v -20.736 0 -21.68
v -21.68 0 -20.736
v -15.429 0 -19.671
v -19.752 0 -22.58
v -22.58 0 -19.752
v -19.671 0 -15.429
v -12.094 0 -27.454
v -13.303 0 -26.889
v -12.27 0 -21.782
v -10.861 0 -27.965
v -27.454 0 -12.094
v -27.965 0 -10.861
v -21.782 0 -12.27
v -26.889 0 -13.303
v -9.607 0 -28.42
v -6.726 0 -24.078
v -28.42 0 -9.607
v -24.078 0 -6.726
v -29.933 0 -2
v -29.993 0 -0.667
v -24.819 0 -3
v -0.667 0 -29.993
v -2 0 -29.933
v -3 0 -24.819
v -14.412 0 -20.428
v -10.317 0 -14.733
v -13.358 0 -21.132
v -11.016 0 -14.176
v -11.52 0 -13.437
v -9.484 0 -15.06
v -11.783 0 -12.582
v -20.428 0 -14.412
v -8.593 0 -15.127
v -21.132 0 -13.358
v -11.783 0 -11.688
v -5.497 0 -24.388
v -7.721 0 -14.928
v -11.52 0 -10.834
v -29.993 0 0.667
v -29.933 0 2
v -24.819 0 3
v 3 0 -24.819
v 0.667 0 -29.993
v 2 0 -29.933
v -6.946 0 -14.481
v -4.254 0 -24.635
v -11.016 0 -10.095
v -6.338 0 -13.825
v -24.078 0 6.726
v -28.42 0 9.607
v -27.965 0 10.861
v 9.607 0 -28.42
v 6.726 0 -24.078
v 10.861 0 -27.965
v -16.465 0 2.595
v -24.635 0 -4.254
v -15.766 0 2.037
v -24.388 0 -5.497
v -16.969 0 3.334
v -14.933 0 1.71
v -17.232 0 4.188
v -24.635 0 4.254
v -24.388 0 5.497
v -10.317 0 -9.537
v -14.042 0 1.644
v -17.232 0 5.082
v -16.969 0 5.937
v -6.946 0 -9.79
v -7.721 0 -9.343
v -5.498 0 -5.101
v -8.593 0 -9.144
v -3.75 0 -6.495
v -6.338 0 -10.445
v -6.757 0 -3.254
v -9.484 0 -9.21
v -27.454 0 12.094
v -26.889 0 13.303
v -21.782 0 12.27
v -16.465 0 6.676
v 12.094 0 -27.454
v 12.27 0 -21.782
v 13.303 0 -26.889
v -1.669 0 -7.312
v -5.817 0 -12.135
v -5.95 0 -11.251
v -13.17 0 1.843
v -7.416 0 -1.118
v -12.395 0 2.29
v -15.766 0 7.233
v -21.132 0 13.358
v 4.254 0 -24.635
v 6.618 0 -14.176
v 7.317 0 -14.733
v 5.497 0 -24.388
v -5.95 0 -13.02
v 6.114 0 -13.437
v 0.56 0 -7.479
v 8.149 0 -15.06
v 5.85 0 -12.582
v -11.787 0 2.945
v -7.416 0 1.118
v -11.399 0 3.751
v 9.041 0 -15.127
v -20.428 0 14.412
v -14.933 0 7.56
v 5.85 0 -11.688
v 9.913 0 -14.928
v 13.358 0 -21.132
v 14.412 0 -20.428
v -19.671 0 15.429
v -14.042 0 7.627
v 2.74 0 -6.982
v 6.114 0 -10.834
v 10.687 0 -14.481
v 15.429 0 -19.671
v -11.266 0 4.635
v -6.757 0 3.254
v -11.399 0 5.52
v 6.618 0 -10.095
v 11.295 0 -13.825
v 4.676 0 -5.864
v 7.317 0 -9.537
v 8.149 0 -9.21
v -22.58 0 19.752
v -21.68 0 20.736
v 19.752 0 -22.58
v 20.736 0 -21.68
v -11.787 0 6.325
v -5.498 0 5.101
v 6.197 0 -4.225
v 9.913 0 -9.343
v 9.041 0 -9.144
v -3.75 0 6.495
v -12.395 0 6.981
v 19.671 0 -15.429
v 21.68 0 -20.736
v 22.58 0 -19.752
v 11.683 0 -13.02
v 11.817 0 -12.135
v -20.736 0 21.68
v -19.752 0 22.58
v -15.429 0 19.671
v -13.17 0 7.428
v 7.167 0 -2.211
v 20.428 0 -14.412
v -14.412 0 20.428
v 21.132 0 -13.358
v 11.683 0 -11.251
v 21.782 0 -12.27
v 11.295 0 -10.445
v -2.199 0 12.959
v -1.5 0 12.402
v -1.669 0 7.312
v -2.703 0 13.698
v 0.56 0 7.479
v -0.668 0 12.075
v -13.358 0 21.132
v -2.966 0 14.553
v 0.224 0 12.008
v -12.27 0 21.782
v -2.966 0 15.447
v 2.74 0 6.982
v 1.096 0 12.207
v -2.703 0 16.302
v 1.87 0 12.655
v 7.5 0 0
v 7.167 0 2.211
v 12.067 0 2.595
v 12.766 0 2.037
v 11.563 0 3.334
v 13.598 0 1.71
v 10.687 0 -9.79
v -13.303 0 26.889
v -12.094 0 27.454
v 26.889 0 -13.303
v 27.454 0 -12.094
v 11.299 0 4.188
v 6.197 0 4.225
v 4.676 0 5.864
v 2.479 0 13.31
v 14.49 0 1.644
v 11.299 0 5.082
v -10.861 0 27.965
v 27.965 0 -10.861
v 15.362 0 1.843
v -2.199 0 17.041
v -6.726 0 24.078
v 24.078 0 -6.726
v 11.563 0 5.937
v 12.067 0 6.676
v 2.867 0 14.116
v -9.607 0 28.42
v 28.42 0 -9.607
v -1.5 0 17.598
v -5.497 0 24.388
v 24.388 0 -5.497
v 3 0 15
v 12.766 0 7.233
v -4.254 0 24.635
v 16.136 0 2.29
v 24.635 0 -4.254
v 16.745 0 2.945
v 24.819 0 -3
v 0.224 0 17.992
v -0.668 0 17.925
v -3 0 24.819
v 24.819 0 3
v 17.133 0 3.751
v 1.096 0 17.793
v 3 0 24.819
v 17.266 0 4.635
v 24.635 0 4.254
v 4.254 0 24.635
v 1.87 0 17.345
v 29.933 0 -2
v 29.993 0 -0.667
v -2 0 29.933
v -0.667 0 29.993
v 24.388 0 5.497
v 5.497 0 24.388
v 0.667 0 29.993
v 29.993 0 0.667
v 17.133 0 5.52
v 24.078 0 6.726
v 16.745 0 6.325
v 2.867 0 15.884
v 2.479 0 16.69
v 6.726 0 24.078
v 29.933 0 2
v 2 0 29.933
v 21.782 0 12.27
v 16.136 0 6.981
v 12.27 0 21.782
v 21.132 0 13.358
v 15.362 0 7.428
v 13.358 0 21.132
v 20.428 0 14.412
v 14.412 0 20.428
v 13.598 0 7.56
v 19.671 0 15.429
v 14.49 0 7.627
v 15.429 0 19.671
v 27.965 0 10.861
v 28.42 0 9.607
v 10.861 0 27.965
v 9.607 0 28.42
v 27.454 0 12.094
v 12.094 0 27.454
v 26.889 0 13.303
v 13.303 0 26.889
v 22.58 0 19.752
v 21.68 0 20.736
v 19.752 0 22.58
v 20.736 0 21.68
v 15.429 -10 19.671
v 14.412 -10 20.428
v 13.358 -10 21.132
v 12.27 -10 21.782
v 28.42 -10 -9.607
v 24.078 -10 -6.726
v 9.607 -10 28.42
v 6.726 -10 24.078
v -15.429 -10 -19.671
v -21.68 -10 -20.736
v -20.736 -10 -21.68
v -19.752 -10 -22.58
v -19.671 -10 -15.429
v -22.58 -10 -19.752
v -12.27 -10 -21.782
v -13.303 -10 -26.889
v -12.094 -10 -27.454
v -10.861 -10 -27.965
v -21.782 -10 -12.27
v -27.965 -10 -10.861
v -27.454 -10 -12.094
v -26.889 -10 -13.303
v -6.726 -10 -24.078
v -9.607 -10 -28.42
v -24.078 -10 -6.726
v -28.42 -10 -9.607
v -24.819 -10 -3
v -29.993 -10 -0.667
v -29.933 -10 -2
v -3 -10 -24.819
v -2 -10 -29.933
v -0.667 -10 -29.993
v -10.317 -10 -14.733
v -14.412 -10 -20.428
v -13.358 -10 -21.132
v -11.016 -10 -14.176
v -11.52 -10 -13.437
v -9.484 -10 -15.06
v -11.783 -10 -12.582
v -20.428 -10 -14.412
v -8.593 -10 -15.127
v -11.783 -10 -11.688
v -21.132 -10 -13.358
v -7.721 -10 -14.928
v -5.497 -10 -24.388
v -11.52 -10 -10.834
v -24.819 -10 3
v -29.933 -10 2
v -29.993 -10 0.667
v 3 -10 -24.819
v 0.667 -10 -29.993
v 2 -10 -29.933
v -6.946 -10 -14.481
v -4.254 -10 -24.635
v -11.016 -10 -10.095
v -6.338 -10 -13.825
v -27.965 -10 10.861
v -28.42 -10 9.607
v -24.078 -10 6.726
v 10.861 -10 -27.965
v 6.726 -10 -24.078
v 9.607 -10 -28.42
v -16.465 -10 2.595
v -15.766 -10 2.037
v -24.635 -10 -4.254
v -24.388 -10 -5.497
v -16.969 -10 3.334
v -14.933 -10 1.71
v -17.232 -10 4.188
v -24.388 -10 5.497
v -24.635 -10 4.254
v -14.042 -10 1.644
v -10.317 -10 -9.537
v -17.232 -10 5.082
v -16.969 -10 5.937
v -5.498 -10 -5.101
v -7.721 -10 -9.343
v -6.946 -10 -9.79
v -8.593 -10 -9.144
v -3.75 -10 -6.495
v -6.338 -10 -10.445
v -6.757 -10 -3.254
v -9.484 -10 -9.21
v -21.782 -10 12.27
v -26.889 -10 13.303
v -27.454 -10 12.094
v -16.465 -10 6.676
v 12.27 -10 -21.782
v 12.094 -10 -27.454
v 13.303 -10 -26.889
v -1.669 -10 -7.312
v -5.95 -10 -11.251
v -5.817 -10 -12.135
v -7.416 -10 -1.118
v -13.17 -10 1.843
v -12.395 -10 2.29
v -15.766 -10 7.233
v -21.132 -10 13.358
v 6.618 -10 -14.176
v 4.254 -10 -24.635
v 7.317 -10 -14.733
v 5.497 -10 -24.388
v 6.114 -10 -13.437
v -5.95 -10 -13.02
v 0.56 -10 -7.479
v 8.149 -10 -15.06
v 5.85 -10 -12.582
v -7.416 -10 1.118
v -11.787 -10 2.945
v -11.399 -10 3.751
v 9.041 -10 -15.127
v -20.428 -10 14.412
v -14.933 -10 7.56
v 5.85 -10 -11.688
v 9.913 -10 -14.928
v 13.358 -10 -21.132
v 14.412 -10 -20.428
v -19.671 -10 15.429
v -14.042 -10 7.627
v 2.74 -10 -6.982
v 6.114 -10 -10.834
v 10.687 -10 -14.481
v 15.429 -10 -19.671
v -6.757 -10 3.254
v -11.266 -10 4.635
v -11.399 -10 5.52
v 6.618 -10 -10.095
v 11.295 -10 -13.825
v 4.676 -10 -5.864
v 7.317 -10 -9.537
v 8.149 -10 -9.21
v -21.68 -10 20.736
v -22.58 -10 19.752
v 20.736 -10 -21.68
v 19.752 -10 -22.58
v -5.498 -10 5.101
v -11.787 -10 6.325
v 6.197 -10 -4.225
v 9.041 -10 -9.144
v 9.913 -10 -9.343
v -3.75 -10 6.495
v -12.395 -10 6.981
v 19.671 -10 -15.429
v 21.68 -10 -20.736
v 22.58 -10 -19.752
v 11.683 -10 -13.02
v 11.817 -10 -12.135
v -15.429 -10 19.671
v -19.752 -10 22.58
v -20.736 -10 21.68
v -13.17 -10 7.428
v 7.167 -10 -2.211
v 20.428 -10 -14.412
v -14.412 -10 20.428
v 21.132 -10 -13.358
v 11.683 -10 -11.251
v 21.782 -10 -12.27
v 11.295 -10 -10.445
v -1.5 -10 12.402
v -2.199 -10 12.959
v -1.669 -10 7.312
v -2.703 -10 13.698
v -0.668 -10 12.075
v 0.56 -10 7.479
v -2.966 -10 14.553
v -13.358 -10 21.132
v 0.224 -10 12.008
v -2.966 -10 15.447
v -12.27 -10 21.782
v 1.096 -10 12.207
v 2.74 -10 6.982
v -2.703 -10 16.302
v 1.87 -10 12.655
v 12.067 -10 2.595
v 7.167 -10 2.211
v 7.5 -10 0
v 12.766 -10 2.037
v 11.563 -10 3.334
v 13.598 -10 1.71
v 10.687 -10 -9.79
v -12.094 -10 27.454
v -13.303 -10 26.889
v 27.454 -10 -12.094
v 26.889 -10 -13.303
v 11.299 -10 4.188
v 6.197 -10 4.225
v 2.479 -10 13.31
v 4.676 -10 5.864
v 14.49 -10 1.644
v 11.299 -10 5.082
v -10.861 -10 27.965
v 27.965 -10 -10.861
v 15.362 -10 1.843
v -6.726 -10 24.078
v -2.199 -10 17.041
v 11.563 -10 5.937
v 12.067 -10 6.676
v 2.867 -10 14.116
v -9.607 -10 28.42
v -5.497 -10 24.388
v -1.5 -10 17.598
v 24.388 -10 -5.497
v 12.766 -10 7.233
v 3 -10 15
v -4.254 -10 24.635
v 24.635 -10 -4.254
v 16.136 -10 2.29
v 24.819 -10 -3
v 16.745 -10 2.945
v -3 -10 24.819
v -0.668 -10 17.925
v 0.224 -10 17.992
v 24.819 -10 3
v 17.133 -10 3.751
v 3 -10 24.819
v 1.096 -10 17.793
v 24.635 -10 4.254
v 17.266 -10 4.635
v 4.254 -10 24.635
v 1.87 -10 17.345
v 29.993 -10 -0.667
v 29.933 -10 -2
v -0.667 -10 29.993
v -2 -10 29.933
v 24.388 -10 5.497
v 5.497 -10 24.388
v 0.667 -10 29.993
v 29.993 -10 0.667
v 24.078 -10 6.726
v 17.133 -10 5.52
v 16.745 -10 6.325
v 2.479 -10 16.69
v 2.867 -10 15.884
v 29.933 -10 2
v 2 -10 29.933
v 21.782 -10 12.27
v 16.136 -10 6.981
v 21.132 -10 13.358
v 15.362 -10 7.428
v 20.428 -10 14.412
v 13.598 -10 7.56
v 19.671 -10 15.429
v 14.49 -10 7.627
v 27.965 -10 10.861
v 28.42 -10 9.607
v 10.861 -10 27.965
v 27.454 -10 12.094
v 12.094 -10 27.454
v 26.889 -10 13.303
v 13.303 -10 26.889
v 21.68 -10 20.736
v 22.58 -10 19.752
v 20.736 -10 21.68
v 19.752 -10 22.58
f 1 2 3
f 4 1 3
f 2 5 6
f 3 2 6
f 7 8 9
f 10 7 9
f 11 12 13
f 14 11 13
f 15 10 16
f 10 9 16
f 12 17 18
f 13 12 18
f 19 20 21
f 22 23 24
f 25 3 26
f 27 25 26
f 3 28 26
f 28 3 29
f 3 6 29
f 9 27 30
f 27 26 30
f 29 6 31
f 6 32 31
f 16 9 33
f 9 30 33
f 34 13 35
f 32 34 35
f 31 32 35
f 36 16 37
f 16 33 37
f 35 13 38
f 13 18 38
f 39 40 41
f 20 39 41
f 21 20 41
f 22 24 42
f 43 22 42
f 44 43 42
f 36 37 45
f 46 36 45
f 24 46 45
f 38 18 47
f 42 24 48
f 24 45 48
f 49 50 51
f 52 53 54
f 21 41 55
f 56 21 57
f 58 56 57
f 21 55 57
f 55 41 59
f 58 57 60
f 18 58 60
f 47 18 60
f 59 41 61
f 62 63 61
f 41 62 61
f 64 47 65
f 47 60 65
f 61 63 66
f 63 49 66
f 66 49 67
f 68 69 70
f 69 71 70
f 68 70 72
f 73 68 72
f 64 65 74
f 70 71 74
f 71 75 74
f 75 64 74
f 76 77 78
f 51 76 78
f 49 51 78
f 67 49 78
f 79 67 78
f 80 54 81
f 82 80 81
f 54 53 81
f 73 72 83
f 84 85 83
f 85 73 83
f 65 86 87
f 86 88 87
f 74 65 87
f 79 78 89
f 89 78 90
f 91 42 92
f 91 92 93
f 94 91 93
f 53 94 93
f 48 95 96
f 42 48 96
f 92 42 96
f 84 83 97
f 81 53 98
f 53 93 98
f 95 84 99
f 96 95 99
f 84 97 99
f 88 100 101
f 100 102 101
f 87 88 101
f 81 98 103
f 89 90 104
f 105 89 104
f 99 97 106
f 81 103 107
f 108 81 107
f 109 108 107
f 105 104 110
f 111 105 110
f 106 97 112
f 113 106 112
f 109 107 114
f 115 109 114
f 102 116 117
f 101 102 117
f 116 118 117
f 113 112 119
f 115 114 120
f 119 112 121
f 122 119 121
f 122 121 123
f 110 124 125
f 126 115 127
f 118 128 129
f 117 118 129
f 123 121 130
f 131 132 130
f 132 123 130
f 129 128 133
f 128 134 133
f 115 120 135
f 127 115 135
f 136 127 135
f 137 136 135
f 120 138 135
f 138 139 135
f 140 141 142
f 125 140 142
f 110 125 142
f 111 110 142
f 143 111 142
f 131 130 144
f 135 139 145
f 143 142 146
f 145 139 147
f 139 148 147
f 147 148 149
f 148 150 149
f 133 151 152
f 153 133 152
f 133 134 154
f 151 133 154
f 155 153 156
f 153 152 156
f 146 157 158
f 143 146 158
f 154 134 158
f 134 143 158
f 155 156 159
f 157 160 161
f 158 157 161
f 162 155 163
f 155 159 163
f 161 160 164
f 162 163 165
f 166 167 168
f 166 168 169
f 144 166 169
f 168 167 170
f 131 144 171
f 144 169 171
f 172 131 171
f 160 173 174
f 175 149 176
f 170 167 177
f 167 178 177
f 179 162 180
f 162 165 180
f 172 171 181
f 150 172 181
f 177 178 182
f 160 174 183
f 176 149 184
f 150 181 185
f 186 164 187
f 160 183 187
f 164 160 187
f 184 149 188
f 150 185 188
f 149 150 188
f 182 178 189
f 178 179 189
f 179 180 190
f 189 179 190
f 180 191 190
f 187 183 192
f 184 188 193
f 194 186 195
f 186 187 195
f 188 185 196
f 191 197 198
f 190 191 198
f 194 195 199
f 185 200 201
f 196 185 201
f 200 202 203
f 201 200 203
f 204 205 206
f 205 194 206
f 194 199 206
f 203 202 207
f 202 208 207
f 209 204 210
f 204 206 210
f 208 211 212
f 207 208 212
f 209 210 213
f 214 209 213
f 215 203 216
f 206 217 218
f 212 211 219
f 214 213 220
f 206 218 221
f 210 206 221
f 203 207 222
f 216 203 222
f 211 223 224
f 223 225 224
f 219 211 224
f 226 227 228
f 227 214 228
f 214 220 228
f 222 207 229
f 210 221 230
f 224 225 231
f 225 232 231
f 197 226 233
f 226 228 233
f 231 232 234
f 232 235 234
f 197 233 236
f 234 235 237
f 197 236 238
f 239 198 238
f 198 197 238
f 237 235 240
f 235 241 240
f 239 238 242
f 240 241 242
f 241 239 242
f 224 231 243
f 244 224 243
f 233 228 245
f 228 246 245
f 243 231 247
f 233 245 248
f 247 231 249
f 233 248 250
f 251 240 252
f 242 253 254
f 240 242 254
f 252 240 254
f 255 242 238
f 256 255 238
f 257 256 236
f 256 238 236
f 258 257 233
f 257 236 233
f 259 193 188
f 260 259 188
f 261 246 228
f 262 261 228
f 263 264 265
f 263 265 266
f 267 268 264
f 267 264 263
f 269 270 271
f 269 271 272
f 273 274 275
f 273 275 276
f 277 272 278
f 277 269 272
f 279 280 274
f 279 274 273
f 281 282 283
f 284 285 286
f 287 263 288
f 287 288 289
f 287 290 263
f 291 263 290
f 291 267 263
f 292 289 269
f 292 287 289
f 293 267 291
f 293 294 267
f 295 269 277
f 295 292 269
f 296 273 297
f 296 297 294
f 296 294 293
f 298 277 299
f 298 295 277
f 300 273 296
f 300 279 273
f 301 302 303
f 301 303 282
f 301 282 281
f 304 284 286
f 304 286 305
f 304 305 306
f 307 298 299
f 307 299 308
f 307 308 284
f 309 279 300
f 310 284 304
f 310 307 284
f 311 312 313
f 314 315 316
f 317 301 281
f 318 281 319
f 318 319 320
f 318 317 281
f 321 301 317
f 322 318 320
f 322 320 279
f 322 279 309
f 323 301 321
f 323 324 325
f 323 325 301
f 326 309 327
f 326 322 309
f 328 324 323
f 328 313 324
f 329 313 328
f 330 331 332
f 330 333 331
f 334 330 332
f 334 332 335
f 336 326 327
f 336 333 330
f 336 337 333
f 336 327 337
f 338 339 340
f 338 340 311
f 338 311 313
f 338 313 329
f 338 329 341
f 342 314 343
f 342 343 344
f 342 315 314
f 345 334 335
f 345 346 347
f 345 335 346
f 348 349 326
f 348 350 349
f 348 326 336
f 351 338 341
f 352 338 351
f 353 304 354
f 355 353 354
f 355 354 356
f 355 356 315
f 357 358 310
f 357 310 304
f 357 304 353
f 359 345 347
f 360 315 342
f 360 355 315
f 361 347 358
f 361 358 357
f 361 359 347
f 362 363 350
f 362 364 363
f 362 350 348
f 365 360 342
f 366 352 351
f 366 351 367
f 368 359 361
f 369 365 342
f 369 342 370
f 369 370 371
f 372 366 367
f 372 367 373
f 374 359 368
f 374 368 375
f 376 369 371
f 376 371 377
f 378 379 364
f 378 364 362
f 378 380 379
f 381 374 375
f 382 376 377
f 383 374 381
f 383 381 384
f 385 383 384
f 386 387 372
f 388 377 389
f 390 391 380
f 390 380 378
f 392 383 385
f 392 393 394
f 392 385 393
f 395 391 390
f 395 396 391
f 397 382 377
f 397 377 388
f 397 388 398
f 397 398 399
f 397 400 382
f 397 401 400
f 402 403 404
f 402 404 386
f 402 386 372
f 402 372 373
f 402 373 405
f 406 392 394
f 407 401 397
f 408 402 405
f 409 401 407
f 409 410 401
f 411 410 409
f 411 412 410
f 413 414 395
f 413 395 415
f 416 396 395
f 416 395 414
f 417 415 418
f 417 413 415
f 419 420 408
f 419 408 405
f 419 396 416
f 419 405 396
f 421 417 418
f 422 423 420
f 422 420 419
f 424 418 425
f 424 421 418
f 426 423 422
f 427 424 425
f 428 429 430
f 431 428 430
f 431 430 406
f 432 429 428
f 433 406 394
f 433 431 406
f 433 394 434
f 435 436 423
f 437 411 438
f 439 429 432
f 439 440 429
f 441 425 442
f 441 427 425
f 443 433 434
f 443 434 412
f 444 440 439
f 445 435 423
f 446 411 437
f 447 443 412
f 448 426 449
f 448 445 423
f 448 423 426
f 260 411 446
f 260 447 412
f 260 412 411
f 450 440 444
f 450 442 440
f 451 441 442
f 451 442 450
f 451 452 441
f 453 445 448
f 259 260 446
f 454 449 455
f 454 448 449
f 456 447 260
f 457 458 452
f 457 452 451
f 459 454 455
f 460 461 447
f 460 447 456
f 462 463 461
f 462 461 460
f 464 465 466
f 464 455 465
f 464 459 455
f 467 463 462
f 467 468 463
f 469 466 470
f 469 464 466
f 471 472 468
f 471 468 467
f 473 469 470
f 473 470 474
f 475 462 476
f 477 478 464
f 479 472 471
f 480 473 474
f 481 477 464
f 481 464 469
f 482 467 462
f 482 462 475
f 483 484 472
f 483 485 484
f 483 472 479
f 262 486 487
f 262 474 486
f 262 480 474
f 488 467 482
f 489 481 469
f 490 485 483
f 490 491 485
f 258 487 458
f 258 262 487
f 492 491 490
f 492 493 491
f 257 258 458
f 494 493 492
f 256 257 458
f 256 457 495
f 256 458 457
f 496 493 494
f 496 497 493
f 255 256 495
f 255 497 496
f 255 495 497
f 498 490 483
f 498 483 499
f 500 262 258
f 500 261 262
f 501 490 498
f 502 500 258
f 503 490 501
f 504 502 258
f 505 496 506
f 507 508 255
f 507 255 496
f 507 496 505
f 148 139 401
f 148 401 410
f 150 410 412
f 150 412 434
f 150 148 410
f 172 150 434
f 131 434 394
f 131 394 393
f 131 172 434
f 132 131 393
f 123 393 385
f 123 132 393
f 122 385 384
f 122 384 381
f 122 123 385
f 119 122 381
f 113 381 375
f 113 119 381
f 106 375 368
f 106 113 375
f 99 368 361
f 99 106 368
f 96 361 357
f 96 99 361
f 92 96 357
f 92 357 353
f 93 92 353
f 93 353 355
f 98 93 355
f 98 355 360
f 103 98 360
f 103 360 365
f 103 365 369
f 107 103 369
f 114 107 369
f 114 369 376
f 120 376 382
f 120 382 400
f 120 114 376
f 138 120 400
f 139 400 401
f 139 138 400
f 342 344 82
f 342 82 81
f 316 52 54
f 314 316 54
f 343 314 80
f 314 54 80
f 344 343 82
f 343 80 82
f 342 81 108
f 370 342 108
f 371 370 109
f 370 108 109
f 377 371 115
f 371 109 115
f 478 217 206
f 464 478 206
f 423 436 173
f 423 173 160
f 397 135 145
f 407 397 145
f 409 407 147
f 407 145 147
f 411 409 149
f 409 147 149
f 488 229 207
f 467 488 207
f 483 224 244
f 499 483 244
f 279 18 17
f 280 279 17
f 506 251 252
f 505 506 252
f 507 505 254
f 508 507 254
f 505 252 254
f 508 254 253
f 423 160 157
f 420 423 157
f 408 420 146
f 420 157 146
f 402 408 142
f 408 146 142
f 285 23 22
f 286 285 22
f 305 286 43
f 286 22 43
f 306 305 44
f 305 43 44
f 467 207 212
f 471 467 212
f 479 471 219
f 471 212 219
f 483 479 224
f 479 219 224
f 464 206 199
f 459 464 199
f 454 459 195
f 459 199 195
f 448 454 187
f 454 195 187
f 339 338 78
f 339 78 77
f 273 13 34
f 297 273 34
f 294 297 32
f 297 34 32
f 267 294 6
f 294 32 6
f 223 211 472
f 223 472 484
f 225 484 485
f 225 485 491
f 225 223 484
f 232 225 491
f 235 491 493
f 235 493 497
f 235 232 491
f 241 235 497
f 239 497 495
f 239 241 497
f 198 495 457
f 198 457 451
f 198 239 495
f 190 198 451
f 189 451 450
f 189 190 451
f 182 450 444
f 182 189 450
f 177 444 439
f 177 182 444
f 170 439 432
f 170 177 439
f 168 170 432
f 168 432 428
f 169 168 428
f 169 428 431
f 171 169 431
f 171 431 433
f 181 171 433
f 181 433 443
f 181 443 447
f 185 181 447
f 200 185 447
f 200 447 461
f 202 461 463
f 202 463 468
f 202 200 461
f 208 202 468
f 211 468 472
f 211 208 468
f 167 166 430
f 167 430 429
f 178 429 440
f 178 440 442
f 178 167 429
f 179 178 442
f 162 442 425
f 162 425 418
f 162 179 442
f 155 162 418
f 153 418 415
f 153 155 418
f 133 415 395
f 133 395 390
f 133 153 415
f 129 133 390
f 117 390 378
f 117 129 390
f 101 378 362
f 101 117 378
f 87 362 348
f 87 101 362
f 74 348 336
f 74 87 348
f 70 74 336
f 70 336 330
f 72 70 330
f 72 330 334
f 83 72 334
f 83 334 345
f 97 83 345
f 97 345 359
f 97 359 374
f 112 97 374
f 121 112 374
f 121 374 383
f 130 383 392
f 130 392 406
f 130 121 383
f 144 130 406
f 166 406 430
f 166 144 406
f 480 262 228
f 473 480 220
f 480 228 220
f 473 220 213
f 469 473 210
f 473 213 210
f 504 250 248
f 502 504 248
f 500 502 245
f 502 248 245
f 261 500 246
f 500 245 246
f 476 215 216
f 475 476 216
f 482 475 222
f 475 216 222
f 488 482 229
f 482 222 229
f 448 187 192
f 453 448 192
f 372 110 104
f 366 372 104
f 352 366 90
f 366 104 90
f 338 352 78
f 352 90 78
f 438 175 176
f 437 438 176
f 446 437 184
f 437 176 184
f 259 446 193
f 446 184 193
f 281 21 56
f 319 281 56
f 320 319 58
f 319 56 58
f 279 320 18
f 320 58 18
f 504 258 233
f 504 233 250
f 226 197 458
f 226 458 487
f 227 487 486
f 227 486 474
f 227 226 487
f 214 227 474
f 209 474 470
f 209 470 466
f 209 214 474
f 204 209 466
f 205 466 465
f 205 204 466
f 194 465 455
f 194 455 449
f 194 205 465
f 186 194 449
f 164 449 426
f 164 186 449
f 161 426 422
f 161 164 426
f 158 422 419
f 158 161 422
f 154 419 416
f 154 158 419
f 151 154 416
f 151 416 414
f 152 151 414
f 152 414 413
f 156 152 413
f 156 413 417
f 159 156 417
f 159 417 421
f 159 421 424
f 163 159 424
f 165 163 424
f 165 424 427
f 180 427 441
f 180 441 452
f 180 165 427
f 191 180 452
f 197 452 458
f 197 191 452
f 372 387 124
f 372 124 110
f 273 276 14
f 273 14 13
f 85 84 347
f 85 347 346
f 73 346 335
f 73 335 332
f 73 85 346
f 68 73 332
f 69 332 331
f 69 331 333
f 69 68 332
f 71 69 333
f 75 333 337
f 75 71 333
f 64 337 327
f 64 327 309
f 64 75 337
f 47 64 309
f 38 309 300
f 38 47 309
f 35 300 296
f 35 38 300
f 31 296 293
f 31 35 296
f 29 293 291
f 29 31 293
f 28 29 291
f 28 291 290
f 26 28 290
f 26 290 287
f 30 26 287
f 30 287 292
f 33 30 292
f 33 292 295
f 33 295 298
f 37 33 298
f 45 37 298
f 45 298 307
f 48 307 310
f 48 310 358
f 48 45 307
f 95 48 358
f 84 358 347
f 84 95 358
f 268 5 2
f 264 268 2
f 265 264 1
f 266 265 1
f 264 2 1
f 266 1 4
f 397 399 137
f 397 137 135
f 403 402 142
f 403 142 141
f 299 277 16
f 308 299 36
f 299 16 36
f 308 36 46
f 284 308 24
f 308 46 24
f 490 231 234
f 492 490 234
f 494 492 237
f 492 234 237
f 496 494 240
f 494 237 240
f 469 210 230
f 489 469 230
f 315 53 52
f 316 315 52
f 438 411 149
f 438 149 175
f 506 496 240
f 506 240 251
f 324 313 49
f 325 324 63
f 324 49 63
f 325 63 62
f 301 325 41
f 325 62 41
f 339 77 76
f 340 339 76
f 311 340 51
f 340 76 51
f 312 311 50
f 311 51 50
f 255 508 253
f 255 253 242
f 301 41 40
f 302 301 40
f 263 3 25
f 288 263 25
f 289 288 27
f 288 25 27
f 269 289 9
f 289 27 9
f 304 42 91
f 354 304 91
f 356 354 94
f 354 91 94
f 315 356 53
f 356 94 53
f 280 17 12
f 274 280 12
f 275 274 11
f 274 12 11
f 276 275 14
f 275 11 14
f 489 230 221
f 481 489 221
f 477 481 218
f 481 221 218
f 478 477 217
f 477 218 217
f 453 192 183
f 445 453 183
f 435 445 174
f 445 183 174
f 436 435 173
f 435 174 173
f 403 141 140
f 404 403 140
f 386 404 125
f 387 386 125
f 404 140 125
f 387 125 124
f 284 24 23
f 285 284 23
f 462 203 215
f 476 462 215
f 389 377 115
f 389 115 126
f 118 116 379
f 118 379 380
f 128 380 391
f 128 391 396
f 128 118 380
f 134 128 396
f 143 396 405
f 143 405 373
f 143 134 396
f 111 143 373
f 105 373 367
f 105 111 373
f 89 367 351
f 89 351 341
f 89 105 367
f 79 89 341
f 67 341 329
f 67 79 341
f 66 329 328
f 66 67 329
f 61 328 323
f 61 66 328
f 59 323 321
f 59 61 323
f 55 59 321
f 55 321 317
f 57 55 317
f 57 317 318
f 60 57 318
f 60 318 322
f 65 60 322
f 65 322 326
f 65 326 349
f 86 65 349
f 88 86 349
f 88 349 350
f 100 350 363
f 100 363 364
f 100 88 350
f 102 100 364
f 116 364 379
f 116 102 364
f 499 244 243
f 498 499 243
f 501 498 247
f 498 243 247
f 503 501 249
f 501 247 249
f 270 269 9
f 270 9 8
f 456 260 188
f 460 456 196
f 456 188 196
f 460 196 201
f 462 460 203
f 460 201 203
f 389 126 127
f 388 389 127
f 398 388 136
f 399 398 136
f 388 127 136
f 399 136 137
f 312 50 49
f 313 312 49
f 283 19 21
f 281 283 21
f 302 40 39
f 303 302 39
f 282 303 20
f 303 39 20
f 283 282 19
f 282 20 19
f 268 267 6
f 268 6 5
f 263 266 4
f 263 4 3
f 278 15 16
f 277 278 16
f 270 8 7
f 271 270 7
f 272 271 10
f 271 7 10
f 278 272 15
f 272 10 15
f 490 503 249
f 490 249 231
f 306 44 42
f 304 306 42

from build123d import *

# Parameters (mm, degrees)
F0_R     = 3
F0_R_2   = 7.5
F1_DEPTH = 10


with BuildPart() as f1:
    # F0 (on Front) → F1 (new body)
    with BuildSketch(Plane.XZ):
        with BuildLine():
            Line((-13.302721, 26.889359), (-12.269592, 21.782037))
            ThreePointArc((-12.269592, 21.782037), (-13.889256, 20.78674), (-15.428608, 19.671249))
            Line((-15.428608, 19.671249), (-19.751797, 22.580224))
            ThreePointArc((-19.751797, 22.580224), (-21.213203, 21.213203), (-22.580224, 19.751797))
            Line((-22.580224, 19.751797), (-19.671249, 15.428608))
            ThreePointArc((-19.671249, 15.428608), (-20.78674, 13.889256), (-21.782037, 12.269592))
            Line((-21.782037, 12.269592), (-26.889359, 13.302721))
            ThreePointArc((-26.889359, 13.302721), (-27.716386, 11.480503), (-28.420092, 9.607203))
            Line((-28.420092, 9.607203), (-24.078137, 6.726314))
            ThreePointArc((-24.078137, 6.726314), (-24.519632, 4.877258), (-24.819347, 3))
            Line((-24.819347, 3), (-29.933259, 2))
            ThreePointArc((-29.933259, 2), (-30, 0), (-29.933259, -2))
            Line((-29.933259, -2), (-24.819347, -3))
            ThreePointArc((-24.819347, -3), (-24.519632, -4.877258), (-24.078137, -6.726314))
            Line((-24.078137, -6.726314), (-28.420092, -9.607203))
            ThreePointArc((-28.420092, -9.607203), (-27.716386, -11.480503), (-26.889359, -13.302721))
            Line((-26.889359, -13.302721), (-21.782037, -12.269592))
            ThreePointArc((-21.782037, -12.269592), (-20.78674, -13.889256), (-19.671249, -15.428608))
            Line((-19.671249, -15.428608), (-22.580224, -19.751797))
            ThreePointArc((-22.580224, -19.751797), (-21.213203, -21.213203), (-19.751797, -22.580224))
            Line((-19.751797, -22.580224), (-15.428608, -19.671249))
            ThreePointArc((-15.428608, -19.671249), (-13.889256, -20.78674), (-12.269592, -21.782037))
            Line((-12.269592, -21.782037), (-13.302721, -26.889359))
            ThreePointArc((-13.302721, -26.889359), (-11.480503, -27.716386), (-9.607203, -28.420092))
            Line((-9.607203, -28.420092), (-6.726314, -24.078137))
            ThreePointArc((-6.726314, -24.078137), (-4.877258, -24.519632), (-3, -24.819347))
            Line((-3, -24.819347), (-2, -29.933259))
            ThreePointArc((-2, -29.933259), (0, -30), (2, -29.933259))
            Line((2, -29.933259), (3, -24.819347))
            ThreePointArc((3, -24.819347), (4.877258, -24.519632), (6.726314, -24.078137))
            Line((6.726314, -24.078137), (9.607203, -28.420092))
            ThreePointArc((9.607203, -28.420092), (11.480503, -27.716386), (13.302721, -26.889359))
            Line((13.302721, -26.889359), (12.269592, -21.782037))
            ThreePointArc((12.269592, -21.782037), (13.889256, -20.78674), (15.428608, -19.671249))
            Line((15.428608, -19.671249), (19.751797, -22.580224))
            ThreePointArc((19.751797, -22.580224), (21.213203, -21.213203), (22.580224, -19.751797))
            Line((22.580224, -19.751797), (19.671249, -15.428608))
            ThreePointArc((19.671249, -15.428608), (20.78674, -13.889256), (21.782037, -12.269592))
            Line((21.782037, -12.269592), (26.889359, -13.302721))
            ThreePointArc((26.889359, -13.302721), (27.716386, -11.480503), (28.420092, -9.607203))
            Line((28.420092, -9.607203), (24.078137, -6.726314))
            ThreePointArc((24.078137, -6.726314), (24.519632, -4.877258), (24.819347, -3))
            Line((24.819347, -3), (29.933259, -2))
            ThreePointArc((29.933259, -2), (30, 0), (29.933259, 2))
            Line((29.933259, 2), (24.819347, 3))
            ThreePointArc((24.819347, 3), (24.519632, 4.877258), (24.078137, 6.726314))
            Line((24.078137, 6.726314), (28.420092, 9.607203))
            ThreePointArc((28.420092, 9.607203), (27.716386, 11.480503), (26.889359, 13.302721))
            Line((26.889359, 13.302721), (21.782037, 12.269592))
            ThreePointArc((21.782037, 12.269592), (20.78674, 13.889256), (19.671249, 15.428608))
            Line((19.671249, 15.428608), (22.580224, 19.751797))
            ThreePointArc((22.580224, 19.751797), (21.213203, 21.213203), (19.751797, 22.580224))
            Line((19.751797, 22.580224), (15.428608, 19.671249))
            ThreePointArc((15.428608, 19.671249), (13.889256, 20.78674), (12.269592, 21.782037))
            Line((12.269592, 21.782037), (13.302721, 26.889359))
            ThreePointArc((13.302721, 26.889359), (11.480503, 27.716386), (9.607203, 28.420092))
            Line((9.607203, 28.420092), (6.726314, 24.078137))
            ThreePointArc((6.726314, 24.078137), (4.877258, 24.519632), (3, 24.819347))
            Line((3, 24.819347), (2, 29.933259))
            ThreePointArc((2, 29.933259), (0, 30), (-2, 29.933259))
            Line((-2, 29.933259), (-3, 24.819347))
            ThreePointArc((-3, 24.819347), (-4.877258, 24.519632), (-6.726314, 24.078137))
            Line((-6.726314, 24.078137), (-9.607203, 28.420092))
            ThreePointArc((-9.607203, 28.420092), (-11.480503, 27.716386), (-13.302721, 26.889359))
        make_face()
        with Locations((-8.816779, -12.135255)):
            Circle(F0_R, mode=Mode.SUBTRACT)
        with Locations((8.816779, -12.135255)):
            Circle(F0_R, mode=Mode.SUBTRACT)
        with Locations((-14.265848, 4.635255)):
            Circle(F0_R, mode=Mode.SUBTRACT)
        Circle(F0_R_2, mode=Mode.SUBTRACT)
        with Locations((14.265848, 4.635255)):
            Circle(F0_R, mode=Mode.SUBTRACT)
        with Locations((0, 15)):
            Circle(F0_R, mode=Mode.SUBTRACT)
    extrude(amount=F1_DEPTH)


solid = f1.part
